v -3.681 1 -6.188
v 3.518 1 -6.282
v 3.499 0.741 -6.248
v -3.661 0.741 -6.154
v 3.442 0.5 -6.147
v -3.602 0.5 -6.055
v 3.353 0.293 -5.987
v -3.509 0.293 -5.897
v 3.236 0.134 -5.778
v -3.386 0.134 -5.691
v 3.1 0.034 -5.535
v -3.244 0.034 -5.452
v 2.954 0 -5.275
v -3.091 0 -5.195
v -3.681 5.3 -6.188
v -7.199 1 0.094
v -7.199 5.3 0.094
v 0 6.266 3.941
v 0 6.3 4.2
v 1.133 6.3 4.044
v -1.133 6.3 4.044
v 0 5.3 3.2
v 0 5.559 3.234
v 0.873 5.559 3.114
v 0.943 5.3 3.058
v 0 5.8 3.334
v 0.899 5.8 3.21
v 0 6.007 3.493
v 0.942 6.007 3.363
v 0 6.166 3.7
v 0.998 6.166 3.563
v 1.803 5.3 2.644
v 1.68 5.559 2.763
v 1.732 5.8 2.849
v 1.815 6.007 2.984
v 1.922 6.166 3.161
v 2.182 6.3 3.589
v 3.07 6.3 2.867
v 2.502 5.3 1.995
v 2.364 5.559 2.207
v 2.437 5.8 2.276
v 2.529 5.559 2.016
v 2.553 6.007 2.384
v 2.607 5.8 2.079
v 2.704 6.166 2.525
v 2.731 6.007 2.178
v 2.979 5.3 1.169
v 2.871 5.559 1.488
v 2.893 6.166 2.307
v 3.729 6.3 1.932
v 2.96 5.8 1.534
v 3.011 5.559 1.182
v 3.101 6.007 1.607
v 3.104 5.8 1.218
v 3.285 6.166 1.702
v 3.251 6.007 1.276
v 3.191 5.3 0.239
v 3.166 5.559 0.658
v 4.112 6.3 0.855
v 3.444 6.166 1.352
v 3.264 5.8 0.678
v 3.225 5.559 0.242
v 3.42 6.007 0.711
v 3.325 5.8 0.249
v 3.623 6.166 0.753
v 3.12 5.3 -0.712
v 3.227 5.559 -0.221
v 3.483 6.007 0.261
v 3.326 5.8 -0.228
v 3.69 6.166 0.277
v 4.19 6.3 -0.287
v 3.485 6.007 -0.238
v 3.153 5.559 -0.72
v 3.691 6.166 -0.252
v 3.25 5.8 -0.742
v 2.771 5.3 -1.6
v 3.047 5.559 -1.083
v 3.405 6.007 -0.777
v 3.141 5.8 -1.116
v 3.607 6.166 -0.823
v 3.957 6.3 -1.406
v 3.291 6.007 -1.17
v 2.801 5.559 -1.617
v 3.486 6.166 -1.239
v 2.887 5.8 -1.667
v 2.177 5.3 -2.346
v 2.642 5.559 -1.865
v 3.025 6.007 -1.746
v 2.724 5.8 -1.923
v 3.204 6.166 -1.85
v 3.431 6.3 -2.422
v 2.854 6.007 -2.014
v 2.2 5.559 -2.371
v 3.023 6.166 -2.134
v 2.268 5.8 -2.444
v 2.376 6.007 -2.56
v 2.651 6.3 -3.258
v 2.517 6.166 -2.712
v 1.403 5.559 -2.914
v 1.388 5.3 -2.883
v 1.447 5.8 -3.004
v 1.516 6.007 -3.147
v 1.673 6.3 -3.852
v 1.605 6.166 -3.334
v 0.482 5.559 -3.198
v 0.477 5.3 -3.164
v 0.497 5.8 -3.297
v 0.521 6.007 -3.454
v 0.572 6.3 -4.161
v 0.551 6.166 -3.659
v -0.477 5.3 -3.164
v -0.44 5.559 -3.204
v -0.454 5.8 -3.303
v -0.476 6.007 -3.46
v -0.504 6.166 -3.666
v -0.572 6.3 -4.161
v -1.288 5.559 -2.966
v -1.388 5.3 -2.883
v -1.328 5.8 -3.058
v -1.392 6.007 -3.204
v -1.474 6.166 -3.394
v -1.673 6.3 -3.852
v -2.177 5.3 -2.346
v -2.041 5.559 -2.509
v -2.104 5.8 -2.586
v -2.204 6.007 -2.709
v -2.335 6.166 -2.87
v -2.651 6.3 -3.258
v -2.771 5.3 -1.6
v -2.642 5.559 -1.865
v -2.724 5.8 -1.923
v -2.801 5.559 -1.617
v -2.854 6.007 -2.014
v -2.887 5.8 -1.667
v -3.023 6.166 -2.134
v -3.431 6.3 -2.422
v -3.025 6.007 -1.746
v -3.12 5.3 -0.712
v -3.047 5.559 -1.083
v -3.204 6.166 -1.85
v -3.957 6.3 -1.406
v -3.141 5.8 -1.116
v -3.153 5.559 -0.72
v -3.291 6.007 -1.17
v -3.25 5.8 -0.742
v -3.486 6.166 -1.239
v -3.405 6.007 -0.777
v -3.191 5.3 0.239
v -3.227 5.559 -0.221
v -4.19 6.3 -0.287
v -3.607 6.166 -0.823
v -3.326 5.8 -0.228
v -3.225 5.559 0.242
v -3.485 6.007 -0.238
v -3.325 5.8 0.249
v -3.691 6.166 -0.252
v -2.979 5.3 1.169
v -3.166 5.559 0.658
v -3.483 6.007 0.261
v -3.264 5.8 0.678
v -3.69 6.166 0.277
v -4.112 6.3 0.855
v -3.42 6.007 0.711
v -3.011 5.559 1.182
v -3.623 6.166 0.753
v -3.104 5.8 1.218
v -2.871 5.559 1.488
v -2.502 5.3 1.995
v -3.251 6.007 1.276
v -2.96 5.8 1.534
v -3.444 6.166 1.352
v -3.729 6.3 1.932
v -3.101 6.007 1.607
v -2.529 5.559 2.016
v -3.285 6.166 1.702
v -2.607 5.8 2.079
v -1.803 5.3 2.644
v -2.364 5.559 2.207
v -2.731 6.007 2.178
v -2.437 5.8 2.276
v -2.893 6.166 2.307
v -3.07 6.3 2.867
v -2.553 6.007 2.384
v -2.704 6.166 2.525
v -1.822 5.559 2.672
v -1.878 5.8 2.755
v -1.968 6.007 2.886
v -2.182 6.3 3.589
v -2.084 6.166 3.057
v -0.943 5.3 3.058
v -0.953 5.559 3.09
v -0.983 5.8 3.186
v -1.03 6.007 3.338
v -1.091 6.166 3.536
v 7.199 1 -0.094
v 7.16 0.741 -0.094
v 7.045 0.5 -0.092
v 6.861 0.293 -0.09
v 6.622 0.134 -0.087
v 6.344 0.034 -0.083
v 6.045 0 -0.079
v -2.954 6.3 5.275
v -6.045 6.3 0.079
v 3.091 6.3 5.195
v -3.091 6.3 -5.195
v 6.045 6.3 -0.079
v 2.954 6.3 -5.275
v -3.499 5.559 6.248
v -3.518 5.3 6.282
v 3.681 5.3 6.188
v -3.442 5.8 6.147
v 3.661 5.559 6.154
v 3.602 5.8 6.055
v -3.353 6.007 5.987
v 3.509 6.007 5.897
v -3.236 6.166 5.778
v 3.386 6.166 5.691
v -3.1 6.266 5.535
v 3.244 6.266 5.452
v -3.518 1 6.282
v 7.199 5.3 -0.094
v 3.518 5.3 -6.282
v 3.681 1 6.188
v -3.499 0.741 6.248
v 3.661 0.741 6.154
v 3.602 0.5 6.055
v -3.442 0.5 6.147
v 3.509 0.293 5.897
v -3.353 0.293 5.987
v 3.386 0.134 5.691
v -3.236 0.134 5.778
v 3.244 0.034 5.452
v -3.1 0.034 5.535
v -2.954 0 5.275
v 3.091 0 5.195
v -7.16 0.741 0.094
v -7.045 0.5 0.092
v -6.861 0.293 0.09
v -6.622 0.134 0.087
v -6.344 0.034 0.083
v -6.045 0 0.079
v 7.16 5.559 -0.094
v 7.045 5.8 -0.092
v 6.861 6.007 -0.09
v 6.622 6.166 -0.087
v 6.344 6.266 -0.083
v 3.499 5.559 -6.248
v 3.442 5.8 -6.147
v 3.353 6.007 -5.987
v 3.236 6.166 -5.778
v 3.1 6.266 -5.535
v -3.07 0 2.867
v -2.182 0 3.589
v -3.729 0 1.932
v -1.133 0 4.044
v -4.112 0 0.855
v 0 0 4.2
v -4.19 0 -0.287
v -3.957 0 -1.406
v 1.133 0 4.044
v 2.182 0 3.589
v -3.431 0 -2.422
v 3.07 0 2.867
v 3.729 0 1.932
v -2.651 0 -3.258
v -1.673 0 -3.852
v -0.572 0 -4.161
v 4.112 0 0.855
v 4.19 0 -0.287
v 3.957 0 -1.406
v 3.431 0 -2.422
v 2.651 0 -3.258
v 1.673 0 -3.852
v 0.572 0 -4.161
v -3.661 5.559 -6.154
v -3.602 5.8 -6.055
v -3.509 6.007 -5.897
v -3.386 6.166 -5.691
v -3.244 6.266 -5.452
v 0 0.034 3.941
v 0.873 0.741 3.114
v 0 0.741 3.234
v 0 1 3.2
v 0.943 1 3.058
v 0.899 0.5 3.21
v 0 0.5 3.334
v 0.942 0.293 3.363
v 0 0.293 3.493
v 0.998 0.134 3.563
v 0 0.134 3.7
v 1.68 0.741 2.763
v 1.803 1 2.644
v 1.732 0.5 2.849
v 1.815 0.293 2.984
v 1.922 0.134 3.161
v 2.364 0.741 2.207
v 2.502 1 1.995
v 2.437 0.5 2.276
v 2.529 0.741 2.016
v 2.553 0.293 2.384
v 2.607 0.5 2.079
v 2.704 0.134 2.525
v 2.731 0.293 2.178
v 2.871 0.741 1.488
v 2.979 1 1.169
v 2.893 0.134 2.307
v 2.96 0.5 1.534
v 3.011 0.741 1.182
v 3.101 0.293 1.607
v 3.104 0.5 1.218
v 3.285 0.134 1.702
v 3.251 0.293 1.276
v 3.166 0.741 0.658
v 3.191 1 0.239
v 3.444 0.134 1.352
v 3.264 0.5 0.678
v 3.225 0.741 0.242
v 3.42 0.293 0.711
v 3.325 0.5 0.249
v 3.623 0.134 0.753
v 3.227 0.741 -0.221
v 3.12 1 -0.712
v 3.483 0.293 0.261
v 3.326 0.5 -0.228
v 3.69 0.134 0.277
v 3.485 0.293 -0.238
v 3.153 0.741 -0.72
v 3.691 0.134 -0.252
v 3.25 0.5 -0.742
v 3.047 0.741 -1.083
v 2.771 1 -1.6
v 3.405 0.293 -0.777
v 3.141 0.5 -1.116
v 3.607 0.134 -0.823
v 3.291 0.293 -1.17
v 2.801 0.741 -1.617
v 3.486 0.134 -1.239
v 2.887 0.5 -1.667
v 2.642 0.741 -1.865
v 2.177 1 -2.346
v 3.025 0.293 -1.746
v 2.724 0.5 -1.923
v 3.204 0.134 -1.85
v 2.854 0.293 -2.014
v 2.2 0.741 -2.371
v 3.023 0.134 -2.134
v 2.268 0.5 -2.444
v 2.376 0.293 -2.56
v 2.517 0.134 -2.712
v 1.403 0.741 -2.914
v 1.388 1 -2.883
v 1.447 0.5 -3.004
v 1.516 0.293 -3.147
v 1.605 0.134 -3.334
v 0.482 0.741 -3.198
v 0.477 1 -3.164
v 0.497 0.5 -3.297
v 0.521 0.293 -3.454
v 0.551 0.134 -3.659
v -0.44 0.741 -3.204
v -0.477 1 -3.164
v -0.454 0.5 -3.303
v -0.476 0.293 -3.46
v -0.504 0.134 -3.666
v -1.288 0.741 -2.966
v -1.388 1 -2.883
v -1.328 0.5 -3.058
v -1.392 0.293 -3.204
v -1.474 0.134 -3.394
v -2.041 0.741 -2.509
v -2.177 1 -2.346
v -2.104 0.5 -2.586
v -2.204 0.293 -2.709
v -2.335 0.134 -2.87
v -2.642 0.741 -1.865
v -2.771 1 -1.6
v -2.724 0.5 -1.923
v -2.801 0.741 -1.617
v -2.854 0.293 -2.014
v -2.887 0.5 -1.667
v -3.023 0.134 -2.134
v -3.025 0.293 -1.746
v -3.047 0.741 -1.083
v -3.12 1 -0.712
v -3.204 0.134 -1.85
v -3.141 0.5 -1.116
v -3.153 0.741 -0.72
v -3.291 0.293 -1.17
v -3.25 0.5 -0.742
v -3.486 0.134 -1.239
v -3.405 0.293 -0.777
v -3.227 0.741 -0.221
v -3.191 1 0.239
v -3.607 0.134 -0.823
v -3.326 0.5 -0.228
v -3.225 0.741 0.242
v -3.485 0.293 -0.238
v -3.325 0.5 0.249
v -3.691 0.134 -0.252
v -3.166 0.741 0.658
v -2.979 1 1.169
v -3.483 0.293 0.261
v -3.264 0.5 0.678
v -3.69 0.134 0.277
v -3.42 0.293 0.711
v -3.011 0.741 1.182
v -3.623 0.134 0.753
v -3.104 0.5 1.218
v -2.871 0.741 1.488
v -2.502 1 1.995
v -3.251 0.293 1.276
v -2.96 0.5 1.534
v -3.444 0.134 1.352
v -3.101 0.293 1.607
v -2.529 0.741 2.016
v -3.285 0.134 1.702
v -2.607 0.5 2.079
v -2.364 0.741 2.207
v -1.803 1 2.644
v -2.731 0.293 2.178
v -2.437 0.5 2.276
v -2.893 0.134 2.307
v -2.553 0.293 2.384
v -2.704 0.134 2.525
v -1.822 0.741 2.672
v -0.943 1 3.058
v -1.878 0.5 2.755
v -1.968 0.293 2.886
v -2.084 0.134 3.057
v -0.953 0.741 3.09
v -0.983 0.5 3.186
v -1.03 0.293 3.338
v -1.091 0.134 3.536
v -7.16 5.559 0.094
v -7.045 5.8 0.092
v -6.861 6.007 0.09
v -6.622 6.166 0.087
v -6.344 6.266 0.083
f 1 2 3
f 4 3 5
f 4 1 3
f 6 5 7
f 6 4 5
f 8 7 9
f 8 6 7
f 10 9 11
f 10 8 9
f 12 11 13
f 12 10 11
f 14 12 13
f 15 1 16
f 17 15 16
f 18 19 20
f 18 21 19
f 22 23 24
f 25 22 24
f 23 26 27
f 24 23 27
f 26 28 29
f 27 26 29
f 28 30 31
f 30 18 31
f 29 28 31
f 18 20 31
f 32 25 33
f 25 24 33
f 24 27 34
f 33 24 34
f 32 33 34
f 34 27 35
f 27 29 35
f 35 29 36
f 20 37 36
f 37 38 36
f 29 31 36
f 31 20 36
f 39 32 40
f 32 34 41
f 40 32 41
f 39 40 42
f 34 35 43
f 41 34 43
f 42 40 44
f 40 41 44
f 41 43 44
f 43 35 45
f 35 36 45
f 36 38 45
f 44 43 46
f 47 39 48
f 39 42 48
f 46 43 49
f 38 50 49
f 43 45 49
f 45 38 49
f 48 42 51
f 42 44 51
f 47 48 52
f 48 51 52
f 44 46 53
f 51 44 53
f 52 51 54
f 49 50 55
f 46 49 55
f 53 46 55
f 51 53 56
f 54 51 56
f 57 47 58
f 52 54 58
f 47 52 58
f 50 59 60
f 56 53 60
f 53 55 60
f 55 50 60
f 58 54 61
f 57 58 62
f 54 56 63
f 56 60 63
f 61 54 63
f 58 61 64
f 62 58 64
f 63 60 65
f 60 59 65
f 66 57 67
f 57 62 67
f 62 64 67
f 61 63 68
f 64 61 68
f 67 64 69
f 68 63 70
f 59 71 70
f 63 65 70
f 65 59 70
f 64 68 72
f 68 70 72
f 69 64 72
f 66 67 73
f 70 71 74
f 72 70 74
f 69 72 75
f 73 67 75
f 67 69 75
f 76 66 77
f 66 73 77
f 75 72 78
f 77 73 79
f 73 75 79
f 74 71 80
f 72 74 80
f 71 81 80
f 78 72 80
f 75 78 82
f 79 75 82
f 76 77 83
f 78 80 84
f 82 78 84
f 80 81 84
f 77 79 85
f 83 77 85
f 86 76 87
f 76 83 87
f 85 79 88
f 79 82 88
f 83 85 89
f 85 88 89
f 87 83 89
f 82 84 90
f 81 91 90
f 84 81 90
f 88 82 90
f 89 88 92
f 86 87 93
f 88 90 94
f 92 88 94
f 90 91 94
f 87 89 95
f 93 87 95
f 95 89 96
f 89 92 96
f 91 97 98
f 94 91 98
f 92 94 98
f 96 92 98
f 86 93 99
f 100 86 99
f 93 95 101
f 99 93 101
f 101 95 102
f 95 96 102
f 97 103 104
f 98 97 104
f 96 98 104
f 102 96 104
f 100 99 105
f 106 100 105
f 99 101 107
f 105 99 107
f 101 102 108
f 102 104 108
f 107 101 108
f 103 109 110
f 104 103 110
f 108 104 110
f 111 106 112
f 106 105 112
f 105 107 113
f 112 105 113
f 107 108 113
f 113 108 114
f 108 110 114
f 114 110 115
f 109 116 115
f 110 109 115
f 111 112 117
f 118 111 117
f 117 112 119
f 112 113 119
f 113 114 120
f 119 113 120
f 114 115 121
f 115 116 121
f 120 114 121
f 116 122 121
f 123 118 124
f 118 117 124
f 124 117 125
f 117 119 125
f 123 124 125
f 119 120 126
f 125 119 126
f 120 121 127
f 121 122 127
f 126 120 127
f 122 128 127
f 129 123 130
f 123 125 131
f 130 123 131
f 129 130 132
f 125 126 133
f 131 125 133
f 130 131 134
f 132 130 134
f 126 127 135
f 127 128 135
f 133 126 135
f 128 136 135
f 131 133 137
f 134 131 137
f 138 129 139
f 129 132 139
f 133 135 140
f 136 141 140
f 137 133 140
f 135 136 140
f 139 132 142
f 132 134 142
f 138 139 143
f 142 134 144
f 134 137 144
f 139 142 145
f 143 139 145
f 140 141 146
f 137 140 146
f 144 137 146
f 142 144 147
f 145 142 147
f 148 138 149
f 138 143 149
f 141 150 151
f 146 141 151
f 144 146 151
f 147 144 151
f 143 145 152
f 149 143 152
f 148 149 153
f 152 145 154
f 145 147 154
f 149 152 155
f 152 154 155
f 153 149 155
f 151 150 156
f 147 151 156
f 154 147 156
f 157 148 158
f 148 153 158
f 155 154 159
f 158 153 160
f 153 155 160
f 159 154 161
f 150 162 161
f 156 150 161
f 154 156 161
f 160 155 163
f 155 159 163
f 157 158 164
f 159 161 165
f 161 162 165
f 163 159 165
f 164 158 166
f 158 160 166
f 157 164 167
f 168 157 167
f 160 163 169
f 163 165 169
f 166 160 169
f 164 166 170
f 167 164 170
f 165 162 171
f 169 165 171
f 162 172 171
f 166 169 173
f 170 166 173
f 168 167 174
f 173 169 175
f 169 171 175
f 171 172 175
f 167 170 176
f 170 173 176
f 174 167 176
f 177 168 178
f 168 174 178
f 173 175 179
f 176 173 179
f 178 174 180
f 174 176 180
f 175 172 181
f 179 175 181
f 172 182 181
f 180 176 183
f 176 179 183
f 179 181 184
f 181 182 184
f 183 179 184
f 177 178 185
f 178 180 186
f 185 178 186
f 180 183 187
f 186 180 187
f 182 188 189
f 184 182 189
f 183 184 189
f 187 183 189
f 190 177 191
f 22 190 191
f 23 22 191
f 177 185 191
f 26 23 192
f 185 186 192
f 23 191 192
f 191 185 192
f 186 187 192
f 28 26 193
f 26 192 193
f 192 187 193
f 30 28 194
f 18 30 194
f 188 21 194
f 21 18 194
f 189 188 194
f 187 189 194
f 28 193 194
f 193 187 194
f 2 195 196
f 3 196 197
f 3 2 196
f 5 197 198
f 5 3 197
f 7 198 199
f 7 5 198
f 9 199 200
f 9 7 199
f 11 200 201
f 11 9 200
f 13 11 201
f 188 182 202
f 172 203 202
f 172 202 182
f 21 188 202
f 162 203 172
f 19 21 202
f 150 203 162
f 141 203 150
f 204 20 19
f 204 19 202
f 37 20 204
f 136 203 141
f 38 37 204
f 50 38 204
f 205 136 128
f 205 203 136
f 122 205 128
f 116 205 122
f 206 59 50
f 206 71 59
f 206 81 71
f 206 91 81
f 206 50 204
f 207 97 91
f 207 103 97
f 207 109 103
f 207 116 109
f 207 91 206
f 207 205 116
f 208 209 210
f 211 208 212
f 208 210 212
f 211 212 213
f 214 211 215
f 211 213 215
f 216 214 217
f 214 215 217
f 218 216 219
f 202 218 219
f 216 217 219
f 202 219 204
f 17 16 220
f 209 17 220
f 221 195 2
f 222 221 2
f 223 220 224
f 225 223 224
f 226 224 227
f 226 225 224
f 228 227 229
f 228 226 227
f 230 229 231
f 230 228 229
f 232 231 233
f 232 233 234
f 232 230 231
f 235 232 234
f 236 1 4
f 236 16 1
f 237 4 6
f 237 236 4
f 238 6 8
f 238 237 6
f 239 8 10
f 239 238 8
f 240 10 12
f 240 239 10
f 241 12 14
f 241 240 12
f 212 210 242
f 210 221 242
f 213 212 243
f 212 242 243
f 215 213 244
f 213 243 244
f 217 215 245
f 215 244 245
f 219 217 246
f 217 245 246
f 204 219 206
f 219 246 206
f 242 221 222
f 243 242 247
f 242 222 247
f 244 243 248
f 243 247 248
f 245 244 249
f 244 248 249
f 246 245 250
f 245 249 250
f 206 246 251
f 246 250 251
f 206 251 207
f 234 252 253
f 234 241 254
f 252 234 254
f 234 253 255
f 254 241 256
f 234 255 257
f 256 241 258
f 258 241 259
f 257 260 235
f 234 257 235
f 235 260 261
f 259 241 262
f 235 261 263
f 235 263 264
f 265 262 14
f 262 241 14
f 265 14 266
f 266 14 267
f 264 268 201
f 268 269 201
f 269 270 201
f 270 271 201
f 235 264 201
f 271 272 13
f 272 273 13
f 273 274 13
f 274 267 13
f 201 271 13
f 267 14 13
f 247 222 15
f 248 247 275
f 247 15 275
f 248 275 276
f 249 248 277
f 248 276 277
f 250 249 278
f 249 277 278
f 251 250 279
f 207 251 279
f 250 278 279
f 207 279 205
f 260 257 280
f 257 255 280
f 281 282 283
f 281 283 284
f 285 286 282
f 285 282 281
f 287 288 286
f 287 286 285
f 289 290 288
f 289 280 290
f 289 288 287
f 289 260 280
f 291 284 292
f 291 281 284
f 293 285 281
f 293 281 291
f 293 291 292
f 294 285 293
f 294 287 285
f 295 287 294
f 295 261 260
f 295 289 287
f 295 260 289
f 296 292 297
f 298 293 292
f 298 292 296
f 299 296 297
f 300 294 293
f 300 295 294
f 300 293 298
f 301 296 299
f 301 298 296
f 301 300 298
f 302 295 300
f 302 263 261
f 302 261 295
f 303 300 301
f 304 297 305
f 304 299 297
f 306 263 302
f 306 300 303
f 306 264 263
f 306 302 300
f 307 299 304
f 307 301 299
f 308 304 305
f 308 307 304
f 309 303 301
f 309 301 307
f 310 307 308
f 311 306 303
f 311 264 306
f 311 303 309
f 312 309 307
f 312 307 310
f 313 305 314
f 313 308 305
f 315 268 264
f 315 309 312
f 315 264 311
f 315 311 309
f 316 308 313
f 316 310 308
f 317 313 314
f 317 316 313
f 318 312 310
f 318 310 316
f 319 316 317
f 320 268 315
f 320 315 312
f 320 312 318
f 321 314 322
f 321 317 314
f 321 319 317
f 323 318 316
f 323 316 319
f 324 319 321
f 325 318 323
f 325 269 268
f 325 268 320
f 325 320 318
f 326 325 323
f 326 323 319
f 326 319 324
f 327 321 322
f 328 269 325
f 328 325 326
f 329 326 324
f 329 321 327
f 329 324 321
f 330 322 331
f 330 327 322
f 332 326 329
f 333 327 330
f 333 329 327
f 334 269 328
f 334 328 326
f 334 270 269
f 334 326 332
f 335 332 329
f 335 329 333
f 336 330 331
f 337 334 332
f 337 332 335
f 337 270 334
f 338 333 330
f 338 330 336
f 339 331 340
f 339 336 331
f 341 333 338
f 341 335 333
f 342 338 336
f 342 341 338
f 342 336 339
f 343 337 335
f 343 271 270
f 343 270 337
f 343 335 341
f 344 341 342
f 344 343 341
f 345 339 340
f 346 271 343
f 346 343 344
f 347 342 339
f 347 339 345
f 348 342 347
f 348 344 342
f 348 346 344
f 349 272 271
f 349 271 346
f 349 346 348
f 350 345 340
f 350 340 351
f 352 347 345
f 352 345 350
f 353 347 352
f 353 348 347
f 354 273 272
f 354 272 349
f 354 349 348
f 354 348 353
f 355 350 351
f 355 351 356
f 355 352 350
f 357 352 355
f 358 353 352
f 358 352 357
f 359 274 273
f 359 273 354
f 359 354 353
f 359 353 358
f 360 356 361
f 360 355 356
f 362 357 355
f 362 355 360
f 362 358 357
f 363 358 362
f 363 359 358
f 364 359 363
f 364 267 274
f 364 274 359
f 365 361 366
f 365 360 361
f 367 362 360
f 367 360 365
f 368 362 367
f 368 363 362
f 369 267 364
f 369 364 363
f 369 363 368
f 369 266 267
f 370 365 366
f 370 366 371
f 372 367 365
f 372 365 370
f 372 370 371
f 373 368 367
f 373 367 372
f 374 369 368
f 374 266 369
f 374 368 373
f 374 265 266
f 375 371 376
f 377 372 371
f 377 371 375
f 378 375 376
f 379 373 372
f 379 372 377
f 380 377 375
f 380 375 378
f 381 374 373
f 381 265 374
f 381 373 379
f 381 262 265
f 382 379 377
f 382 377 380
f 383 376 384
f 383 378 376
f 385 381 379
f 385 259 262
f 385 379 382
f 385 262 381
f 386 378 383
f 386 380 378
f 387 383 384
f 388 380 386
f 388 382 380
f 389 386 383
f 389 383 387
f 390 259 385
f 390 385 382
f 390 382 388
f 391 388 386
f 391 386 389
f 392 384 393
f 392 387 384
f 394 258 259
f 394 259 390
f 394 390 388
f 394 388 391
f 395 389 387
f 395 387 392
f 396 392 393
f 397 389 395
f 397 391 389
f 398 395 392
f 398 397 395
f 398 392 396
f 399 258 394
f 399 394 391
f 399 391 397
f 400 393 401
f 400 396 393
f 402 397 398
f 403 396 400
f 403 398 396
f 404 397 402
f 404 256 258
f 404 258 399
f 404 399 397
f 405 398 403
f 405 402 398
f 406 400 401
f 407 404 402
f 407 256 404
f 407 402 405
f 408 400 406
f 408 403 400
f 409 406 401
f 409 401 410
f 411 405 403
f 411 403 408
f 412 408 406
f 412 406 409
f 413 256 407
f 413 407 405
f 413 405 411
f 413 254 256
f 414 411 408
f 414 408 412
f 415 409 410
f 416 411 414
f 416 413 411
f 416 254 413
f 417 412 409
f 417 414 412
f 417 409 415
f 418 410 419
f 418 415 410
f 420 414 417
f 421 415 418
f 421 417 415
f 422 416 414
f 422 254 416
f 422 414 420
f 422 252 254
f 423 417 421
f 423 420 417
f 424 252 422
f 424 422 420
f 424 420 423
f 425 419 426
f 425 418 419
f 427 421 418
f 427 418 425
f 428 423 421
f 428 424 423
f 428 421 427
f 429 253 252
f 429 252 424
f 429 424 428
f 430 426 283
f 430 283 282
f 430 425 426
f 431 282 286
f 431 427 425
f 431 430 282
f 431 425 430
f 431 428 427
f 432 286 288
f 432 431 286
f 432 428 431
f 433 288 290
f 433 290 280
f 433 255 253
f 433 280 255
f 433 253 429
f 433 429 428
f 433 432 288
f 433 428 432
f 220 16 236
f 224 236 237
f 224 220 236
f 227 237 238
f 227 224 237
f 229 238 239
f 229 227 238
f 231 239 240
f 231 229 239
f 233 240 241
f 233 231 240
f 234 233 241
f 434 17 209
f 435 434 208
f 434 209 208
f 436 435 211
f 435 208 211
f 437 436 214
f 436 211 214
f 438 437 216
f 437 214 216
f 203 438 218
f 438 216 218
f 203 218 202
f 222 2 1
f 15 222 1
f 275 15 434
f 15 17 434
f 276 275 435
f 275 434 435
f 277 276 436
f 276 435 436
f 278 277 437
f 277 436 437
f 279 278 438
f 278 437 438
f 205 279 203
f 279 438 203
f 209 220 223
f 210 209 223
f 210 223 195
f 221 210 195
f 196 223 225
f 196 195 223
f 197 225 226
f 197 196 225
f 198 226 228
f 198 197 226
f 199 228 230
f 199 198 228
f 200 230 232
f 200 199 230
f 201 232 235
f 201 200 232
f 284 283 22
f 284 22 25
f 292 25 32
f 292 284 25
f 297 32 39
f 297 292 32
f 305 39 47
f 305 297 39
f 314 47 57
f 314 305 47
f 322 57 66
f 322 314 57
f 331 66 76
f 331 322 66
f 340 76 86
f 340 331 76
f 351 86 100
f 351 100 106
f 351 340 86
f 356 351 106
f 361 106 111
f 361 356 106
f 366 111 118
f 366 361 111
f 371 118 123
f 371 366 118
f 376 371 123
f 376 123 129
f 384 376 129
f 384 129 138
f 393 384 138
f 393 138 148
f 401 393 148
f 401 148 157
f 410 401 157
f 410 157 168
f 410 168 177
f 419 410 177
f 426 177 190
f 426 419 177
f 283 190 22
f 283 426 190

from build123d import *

# Parameters (mm, degrees)
SKETCH1_R           = 3.2
BOSS_EXTRUDE1_DEPTH = 6.3
FILLET1_R           = 1


with BuildPart() as part:
    # Sketch1 → Boss-Extrude1 (new body)
    with BuildSketch(Plane(origin=(0, 0, 0), x_dir=(1, 0, 0), z_dir=(0, 1, 0))):
        Polygon((-3.681439065, 6.187649506), (-7.199381195, -0.094395), (-3.517942129, -6.282044506), (3.681439065, -6.187649506), (7.199381195, 0.094395), (3.517942129, 6.282044506), align=None)
        with Locations(Location((0, 0, 0), (0, 0, 270))):  # turned: the seam where the file's is
            Circle(SKETCH1_R, mode=Mode.SUBTRACT)
    extrude(amount=BOSS_EXTRUDE1_DEPTH)

    # Fillet1
    fillet1_edges = [part.edges().sort_by_distance(p)[0] for p in [
        (-5.358661662, 6.3, 3.188219753),
        (0.081748468, 6.3, 6.234847006),
        (5.44041013, 6.3, 3.046627253),
        (0, 0, -3.2),
        (0, 6.3, -3.2),
        (5.358661662, 6.3, -3.188219753),
        (-0.081748468, 6.3, -6.234847006),
        (5.358661662, 0, -3.188219753),
        (5.44041013, 0, 3.046627253),
        (0.081748468, 0, 6.234847006),
        (-5.44041013, 6.3, -3.046627253),
        (-5.358661662, 0, 3.188219753),
        (-5.44041013, 0, -3.046627253),
        (-0.081748468, 0, -6.234847006),
    ]]
    fillet(fillet1_edges, radius=FILLET1_R)


solid = part.part
